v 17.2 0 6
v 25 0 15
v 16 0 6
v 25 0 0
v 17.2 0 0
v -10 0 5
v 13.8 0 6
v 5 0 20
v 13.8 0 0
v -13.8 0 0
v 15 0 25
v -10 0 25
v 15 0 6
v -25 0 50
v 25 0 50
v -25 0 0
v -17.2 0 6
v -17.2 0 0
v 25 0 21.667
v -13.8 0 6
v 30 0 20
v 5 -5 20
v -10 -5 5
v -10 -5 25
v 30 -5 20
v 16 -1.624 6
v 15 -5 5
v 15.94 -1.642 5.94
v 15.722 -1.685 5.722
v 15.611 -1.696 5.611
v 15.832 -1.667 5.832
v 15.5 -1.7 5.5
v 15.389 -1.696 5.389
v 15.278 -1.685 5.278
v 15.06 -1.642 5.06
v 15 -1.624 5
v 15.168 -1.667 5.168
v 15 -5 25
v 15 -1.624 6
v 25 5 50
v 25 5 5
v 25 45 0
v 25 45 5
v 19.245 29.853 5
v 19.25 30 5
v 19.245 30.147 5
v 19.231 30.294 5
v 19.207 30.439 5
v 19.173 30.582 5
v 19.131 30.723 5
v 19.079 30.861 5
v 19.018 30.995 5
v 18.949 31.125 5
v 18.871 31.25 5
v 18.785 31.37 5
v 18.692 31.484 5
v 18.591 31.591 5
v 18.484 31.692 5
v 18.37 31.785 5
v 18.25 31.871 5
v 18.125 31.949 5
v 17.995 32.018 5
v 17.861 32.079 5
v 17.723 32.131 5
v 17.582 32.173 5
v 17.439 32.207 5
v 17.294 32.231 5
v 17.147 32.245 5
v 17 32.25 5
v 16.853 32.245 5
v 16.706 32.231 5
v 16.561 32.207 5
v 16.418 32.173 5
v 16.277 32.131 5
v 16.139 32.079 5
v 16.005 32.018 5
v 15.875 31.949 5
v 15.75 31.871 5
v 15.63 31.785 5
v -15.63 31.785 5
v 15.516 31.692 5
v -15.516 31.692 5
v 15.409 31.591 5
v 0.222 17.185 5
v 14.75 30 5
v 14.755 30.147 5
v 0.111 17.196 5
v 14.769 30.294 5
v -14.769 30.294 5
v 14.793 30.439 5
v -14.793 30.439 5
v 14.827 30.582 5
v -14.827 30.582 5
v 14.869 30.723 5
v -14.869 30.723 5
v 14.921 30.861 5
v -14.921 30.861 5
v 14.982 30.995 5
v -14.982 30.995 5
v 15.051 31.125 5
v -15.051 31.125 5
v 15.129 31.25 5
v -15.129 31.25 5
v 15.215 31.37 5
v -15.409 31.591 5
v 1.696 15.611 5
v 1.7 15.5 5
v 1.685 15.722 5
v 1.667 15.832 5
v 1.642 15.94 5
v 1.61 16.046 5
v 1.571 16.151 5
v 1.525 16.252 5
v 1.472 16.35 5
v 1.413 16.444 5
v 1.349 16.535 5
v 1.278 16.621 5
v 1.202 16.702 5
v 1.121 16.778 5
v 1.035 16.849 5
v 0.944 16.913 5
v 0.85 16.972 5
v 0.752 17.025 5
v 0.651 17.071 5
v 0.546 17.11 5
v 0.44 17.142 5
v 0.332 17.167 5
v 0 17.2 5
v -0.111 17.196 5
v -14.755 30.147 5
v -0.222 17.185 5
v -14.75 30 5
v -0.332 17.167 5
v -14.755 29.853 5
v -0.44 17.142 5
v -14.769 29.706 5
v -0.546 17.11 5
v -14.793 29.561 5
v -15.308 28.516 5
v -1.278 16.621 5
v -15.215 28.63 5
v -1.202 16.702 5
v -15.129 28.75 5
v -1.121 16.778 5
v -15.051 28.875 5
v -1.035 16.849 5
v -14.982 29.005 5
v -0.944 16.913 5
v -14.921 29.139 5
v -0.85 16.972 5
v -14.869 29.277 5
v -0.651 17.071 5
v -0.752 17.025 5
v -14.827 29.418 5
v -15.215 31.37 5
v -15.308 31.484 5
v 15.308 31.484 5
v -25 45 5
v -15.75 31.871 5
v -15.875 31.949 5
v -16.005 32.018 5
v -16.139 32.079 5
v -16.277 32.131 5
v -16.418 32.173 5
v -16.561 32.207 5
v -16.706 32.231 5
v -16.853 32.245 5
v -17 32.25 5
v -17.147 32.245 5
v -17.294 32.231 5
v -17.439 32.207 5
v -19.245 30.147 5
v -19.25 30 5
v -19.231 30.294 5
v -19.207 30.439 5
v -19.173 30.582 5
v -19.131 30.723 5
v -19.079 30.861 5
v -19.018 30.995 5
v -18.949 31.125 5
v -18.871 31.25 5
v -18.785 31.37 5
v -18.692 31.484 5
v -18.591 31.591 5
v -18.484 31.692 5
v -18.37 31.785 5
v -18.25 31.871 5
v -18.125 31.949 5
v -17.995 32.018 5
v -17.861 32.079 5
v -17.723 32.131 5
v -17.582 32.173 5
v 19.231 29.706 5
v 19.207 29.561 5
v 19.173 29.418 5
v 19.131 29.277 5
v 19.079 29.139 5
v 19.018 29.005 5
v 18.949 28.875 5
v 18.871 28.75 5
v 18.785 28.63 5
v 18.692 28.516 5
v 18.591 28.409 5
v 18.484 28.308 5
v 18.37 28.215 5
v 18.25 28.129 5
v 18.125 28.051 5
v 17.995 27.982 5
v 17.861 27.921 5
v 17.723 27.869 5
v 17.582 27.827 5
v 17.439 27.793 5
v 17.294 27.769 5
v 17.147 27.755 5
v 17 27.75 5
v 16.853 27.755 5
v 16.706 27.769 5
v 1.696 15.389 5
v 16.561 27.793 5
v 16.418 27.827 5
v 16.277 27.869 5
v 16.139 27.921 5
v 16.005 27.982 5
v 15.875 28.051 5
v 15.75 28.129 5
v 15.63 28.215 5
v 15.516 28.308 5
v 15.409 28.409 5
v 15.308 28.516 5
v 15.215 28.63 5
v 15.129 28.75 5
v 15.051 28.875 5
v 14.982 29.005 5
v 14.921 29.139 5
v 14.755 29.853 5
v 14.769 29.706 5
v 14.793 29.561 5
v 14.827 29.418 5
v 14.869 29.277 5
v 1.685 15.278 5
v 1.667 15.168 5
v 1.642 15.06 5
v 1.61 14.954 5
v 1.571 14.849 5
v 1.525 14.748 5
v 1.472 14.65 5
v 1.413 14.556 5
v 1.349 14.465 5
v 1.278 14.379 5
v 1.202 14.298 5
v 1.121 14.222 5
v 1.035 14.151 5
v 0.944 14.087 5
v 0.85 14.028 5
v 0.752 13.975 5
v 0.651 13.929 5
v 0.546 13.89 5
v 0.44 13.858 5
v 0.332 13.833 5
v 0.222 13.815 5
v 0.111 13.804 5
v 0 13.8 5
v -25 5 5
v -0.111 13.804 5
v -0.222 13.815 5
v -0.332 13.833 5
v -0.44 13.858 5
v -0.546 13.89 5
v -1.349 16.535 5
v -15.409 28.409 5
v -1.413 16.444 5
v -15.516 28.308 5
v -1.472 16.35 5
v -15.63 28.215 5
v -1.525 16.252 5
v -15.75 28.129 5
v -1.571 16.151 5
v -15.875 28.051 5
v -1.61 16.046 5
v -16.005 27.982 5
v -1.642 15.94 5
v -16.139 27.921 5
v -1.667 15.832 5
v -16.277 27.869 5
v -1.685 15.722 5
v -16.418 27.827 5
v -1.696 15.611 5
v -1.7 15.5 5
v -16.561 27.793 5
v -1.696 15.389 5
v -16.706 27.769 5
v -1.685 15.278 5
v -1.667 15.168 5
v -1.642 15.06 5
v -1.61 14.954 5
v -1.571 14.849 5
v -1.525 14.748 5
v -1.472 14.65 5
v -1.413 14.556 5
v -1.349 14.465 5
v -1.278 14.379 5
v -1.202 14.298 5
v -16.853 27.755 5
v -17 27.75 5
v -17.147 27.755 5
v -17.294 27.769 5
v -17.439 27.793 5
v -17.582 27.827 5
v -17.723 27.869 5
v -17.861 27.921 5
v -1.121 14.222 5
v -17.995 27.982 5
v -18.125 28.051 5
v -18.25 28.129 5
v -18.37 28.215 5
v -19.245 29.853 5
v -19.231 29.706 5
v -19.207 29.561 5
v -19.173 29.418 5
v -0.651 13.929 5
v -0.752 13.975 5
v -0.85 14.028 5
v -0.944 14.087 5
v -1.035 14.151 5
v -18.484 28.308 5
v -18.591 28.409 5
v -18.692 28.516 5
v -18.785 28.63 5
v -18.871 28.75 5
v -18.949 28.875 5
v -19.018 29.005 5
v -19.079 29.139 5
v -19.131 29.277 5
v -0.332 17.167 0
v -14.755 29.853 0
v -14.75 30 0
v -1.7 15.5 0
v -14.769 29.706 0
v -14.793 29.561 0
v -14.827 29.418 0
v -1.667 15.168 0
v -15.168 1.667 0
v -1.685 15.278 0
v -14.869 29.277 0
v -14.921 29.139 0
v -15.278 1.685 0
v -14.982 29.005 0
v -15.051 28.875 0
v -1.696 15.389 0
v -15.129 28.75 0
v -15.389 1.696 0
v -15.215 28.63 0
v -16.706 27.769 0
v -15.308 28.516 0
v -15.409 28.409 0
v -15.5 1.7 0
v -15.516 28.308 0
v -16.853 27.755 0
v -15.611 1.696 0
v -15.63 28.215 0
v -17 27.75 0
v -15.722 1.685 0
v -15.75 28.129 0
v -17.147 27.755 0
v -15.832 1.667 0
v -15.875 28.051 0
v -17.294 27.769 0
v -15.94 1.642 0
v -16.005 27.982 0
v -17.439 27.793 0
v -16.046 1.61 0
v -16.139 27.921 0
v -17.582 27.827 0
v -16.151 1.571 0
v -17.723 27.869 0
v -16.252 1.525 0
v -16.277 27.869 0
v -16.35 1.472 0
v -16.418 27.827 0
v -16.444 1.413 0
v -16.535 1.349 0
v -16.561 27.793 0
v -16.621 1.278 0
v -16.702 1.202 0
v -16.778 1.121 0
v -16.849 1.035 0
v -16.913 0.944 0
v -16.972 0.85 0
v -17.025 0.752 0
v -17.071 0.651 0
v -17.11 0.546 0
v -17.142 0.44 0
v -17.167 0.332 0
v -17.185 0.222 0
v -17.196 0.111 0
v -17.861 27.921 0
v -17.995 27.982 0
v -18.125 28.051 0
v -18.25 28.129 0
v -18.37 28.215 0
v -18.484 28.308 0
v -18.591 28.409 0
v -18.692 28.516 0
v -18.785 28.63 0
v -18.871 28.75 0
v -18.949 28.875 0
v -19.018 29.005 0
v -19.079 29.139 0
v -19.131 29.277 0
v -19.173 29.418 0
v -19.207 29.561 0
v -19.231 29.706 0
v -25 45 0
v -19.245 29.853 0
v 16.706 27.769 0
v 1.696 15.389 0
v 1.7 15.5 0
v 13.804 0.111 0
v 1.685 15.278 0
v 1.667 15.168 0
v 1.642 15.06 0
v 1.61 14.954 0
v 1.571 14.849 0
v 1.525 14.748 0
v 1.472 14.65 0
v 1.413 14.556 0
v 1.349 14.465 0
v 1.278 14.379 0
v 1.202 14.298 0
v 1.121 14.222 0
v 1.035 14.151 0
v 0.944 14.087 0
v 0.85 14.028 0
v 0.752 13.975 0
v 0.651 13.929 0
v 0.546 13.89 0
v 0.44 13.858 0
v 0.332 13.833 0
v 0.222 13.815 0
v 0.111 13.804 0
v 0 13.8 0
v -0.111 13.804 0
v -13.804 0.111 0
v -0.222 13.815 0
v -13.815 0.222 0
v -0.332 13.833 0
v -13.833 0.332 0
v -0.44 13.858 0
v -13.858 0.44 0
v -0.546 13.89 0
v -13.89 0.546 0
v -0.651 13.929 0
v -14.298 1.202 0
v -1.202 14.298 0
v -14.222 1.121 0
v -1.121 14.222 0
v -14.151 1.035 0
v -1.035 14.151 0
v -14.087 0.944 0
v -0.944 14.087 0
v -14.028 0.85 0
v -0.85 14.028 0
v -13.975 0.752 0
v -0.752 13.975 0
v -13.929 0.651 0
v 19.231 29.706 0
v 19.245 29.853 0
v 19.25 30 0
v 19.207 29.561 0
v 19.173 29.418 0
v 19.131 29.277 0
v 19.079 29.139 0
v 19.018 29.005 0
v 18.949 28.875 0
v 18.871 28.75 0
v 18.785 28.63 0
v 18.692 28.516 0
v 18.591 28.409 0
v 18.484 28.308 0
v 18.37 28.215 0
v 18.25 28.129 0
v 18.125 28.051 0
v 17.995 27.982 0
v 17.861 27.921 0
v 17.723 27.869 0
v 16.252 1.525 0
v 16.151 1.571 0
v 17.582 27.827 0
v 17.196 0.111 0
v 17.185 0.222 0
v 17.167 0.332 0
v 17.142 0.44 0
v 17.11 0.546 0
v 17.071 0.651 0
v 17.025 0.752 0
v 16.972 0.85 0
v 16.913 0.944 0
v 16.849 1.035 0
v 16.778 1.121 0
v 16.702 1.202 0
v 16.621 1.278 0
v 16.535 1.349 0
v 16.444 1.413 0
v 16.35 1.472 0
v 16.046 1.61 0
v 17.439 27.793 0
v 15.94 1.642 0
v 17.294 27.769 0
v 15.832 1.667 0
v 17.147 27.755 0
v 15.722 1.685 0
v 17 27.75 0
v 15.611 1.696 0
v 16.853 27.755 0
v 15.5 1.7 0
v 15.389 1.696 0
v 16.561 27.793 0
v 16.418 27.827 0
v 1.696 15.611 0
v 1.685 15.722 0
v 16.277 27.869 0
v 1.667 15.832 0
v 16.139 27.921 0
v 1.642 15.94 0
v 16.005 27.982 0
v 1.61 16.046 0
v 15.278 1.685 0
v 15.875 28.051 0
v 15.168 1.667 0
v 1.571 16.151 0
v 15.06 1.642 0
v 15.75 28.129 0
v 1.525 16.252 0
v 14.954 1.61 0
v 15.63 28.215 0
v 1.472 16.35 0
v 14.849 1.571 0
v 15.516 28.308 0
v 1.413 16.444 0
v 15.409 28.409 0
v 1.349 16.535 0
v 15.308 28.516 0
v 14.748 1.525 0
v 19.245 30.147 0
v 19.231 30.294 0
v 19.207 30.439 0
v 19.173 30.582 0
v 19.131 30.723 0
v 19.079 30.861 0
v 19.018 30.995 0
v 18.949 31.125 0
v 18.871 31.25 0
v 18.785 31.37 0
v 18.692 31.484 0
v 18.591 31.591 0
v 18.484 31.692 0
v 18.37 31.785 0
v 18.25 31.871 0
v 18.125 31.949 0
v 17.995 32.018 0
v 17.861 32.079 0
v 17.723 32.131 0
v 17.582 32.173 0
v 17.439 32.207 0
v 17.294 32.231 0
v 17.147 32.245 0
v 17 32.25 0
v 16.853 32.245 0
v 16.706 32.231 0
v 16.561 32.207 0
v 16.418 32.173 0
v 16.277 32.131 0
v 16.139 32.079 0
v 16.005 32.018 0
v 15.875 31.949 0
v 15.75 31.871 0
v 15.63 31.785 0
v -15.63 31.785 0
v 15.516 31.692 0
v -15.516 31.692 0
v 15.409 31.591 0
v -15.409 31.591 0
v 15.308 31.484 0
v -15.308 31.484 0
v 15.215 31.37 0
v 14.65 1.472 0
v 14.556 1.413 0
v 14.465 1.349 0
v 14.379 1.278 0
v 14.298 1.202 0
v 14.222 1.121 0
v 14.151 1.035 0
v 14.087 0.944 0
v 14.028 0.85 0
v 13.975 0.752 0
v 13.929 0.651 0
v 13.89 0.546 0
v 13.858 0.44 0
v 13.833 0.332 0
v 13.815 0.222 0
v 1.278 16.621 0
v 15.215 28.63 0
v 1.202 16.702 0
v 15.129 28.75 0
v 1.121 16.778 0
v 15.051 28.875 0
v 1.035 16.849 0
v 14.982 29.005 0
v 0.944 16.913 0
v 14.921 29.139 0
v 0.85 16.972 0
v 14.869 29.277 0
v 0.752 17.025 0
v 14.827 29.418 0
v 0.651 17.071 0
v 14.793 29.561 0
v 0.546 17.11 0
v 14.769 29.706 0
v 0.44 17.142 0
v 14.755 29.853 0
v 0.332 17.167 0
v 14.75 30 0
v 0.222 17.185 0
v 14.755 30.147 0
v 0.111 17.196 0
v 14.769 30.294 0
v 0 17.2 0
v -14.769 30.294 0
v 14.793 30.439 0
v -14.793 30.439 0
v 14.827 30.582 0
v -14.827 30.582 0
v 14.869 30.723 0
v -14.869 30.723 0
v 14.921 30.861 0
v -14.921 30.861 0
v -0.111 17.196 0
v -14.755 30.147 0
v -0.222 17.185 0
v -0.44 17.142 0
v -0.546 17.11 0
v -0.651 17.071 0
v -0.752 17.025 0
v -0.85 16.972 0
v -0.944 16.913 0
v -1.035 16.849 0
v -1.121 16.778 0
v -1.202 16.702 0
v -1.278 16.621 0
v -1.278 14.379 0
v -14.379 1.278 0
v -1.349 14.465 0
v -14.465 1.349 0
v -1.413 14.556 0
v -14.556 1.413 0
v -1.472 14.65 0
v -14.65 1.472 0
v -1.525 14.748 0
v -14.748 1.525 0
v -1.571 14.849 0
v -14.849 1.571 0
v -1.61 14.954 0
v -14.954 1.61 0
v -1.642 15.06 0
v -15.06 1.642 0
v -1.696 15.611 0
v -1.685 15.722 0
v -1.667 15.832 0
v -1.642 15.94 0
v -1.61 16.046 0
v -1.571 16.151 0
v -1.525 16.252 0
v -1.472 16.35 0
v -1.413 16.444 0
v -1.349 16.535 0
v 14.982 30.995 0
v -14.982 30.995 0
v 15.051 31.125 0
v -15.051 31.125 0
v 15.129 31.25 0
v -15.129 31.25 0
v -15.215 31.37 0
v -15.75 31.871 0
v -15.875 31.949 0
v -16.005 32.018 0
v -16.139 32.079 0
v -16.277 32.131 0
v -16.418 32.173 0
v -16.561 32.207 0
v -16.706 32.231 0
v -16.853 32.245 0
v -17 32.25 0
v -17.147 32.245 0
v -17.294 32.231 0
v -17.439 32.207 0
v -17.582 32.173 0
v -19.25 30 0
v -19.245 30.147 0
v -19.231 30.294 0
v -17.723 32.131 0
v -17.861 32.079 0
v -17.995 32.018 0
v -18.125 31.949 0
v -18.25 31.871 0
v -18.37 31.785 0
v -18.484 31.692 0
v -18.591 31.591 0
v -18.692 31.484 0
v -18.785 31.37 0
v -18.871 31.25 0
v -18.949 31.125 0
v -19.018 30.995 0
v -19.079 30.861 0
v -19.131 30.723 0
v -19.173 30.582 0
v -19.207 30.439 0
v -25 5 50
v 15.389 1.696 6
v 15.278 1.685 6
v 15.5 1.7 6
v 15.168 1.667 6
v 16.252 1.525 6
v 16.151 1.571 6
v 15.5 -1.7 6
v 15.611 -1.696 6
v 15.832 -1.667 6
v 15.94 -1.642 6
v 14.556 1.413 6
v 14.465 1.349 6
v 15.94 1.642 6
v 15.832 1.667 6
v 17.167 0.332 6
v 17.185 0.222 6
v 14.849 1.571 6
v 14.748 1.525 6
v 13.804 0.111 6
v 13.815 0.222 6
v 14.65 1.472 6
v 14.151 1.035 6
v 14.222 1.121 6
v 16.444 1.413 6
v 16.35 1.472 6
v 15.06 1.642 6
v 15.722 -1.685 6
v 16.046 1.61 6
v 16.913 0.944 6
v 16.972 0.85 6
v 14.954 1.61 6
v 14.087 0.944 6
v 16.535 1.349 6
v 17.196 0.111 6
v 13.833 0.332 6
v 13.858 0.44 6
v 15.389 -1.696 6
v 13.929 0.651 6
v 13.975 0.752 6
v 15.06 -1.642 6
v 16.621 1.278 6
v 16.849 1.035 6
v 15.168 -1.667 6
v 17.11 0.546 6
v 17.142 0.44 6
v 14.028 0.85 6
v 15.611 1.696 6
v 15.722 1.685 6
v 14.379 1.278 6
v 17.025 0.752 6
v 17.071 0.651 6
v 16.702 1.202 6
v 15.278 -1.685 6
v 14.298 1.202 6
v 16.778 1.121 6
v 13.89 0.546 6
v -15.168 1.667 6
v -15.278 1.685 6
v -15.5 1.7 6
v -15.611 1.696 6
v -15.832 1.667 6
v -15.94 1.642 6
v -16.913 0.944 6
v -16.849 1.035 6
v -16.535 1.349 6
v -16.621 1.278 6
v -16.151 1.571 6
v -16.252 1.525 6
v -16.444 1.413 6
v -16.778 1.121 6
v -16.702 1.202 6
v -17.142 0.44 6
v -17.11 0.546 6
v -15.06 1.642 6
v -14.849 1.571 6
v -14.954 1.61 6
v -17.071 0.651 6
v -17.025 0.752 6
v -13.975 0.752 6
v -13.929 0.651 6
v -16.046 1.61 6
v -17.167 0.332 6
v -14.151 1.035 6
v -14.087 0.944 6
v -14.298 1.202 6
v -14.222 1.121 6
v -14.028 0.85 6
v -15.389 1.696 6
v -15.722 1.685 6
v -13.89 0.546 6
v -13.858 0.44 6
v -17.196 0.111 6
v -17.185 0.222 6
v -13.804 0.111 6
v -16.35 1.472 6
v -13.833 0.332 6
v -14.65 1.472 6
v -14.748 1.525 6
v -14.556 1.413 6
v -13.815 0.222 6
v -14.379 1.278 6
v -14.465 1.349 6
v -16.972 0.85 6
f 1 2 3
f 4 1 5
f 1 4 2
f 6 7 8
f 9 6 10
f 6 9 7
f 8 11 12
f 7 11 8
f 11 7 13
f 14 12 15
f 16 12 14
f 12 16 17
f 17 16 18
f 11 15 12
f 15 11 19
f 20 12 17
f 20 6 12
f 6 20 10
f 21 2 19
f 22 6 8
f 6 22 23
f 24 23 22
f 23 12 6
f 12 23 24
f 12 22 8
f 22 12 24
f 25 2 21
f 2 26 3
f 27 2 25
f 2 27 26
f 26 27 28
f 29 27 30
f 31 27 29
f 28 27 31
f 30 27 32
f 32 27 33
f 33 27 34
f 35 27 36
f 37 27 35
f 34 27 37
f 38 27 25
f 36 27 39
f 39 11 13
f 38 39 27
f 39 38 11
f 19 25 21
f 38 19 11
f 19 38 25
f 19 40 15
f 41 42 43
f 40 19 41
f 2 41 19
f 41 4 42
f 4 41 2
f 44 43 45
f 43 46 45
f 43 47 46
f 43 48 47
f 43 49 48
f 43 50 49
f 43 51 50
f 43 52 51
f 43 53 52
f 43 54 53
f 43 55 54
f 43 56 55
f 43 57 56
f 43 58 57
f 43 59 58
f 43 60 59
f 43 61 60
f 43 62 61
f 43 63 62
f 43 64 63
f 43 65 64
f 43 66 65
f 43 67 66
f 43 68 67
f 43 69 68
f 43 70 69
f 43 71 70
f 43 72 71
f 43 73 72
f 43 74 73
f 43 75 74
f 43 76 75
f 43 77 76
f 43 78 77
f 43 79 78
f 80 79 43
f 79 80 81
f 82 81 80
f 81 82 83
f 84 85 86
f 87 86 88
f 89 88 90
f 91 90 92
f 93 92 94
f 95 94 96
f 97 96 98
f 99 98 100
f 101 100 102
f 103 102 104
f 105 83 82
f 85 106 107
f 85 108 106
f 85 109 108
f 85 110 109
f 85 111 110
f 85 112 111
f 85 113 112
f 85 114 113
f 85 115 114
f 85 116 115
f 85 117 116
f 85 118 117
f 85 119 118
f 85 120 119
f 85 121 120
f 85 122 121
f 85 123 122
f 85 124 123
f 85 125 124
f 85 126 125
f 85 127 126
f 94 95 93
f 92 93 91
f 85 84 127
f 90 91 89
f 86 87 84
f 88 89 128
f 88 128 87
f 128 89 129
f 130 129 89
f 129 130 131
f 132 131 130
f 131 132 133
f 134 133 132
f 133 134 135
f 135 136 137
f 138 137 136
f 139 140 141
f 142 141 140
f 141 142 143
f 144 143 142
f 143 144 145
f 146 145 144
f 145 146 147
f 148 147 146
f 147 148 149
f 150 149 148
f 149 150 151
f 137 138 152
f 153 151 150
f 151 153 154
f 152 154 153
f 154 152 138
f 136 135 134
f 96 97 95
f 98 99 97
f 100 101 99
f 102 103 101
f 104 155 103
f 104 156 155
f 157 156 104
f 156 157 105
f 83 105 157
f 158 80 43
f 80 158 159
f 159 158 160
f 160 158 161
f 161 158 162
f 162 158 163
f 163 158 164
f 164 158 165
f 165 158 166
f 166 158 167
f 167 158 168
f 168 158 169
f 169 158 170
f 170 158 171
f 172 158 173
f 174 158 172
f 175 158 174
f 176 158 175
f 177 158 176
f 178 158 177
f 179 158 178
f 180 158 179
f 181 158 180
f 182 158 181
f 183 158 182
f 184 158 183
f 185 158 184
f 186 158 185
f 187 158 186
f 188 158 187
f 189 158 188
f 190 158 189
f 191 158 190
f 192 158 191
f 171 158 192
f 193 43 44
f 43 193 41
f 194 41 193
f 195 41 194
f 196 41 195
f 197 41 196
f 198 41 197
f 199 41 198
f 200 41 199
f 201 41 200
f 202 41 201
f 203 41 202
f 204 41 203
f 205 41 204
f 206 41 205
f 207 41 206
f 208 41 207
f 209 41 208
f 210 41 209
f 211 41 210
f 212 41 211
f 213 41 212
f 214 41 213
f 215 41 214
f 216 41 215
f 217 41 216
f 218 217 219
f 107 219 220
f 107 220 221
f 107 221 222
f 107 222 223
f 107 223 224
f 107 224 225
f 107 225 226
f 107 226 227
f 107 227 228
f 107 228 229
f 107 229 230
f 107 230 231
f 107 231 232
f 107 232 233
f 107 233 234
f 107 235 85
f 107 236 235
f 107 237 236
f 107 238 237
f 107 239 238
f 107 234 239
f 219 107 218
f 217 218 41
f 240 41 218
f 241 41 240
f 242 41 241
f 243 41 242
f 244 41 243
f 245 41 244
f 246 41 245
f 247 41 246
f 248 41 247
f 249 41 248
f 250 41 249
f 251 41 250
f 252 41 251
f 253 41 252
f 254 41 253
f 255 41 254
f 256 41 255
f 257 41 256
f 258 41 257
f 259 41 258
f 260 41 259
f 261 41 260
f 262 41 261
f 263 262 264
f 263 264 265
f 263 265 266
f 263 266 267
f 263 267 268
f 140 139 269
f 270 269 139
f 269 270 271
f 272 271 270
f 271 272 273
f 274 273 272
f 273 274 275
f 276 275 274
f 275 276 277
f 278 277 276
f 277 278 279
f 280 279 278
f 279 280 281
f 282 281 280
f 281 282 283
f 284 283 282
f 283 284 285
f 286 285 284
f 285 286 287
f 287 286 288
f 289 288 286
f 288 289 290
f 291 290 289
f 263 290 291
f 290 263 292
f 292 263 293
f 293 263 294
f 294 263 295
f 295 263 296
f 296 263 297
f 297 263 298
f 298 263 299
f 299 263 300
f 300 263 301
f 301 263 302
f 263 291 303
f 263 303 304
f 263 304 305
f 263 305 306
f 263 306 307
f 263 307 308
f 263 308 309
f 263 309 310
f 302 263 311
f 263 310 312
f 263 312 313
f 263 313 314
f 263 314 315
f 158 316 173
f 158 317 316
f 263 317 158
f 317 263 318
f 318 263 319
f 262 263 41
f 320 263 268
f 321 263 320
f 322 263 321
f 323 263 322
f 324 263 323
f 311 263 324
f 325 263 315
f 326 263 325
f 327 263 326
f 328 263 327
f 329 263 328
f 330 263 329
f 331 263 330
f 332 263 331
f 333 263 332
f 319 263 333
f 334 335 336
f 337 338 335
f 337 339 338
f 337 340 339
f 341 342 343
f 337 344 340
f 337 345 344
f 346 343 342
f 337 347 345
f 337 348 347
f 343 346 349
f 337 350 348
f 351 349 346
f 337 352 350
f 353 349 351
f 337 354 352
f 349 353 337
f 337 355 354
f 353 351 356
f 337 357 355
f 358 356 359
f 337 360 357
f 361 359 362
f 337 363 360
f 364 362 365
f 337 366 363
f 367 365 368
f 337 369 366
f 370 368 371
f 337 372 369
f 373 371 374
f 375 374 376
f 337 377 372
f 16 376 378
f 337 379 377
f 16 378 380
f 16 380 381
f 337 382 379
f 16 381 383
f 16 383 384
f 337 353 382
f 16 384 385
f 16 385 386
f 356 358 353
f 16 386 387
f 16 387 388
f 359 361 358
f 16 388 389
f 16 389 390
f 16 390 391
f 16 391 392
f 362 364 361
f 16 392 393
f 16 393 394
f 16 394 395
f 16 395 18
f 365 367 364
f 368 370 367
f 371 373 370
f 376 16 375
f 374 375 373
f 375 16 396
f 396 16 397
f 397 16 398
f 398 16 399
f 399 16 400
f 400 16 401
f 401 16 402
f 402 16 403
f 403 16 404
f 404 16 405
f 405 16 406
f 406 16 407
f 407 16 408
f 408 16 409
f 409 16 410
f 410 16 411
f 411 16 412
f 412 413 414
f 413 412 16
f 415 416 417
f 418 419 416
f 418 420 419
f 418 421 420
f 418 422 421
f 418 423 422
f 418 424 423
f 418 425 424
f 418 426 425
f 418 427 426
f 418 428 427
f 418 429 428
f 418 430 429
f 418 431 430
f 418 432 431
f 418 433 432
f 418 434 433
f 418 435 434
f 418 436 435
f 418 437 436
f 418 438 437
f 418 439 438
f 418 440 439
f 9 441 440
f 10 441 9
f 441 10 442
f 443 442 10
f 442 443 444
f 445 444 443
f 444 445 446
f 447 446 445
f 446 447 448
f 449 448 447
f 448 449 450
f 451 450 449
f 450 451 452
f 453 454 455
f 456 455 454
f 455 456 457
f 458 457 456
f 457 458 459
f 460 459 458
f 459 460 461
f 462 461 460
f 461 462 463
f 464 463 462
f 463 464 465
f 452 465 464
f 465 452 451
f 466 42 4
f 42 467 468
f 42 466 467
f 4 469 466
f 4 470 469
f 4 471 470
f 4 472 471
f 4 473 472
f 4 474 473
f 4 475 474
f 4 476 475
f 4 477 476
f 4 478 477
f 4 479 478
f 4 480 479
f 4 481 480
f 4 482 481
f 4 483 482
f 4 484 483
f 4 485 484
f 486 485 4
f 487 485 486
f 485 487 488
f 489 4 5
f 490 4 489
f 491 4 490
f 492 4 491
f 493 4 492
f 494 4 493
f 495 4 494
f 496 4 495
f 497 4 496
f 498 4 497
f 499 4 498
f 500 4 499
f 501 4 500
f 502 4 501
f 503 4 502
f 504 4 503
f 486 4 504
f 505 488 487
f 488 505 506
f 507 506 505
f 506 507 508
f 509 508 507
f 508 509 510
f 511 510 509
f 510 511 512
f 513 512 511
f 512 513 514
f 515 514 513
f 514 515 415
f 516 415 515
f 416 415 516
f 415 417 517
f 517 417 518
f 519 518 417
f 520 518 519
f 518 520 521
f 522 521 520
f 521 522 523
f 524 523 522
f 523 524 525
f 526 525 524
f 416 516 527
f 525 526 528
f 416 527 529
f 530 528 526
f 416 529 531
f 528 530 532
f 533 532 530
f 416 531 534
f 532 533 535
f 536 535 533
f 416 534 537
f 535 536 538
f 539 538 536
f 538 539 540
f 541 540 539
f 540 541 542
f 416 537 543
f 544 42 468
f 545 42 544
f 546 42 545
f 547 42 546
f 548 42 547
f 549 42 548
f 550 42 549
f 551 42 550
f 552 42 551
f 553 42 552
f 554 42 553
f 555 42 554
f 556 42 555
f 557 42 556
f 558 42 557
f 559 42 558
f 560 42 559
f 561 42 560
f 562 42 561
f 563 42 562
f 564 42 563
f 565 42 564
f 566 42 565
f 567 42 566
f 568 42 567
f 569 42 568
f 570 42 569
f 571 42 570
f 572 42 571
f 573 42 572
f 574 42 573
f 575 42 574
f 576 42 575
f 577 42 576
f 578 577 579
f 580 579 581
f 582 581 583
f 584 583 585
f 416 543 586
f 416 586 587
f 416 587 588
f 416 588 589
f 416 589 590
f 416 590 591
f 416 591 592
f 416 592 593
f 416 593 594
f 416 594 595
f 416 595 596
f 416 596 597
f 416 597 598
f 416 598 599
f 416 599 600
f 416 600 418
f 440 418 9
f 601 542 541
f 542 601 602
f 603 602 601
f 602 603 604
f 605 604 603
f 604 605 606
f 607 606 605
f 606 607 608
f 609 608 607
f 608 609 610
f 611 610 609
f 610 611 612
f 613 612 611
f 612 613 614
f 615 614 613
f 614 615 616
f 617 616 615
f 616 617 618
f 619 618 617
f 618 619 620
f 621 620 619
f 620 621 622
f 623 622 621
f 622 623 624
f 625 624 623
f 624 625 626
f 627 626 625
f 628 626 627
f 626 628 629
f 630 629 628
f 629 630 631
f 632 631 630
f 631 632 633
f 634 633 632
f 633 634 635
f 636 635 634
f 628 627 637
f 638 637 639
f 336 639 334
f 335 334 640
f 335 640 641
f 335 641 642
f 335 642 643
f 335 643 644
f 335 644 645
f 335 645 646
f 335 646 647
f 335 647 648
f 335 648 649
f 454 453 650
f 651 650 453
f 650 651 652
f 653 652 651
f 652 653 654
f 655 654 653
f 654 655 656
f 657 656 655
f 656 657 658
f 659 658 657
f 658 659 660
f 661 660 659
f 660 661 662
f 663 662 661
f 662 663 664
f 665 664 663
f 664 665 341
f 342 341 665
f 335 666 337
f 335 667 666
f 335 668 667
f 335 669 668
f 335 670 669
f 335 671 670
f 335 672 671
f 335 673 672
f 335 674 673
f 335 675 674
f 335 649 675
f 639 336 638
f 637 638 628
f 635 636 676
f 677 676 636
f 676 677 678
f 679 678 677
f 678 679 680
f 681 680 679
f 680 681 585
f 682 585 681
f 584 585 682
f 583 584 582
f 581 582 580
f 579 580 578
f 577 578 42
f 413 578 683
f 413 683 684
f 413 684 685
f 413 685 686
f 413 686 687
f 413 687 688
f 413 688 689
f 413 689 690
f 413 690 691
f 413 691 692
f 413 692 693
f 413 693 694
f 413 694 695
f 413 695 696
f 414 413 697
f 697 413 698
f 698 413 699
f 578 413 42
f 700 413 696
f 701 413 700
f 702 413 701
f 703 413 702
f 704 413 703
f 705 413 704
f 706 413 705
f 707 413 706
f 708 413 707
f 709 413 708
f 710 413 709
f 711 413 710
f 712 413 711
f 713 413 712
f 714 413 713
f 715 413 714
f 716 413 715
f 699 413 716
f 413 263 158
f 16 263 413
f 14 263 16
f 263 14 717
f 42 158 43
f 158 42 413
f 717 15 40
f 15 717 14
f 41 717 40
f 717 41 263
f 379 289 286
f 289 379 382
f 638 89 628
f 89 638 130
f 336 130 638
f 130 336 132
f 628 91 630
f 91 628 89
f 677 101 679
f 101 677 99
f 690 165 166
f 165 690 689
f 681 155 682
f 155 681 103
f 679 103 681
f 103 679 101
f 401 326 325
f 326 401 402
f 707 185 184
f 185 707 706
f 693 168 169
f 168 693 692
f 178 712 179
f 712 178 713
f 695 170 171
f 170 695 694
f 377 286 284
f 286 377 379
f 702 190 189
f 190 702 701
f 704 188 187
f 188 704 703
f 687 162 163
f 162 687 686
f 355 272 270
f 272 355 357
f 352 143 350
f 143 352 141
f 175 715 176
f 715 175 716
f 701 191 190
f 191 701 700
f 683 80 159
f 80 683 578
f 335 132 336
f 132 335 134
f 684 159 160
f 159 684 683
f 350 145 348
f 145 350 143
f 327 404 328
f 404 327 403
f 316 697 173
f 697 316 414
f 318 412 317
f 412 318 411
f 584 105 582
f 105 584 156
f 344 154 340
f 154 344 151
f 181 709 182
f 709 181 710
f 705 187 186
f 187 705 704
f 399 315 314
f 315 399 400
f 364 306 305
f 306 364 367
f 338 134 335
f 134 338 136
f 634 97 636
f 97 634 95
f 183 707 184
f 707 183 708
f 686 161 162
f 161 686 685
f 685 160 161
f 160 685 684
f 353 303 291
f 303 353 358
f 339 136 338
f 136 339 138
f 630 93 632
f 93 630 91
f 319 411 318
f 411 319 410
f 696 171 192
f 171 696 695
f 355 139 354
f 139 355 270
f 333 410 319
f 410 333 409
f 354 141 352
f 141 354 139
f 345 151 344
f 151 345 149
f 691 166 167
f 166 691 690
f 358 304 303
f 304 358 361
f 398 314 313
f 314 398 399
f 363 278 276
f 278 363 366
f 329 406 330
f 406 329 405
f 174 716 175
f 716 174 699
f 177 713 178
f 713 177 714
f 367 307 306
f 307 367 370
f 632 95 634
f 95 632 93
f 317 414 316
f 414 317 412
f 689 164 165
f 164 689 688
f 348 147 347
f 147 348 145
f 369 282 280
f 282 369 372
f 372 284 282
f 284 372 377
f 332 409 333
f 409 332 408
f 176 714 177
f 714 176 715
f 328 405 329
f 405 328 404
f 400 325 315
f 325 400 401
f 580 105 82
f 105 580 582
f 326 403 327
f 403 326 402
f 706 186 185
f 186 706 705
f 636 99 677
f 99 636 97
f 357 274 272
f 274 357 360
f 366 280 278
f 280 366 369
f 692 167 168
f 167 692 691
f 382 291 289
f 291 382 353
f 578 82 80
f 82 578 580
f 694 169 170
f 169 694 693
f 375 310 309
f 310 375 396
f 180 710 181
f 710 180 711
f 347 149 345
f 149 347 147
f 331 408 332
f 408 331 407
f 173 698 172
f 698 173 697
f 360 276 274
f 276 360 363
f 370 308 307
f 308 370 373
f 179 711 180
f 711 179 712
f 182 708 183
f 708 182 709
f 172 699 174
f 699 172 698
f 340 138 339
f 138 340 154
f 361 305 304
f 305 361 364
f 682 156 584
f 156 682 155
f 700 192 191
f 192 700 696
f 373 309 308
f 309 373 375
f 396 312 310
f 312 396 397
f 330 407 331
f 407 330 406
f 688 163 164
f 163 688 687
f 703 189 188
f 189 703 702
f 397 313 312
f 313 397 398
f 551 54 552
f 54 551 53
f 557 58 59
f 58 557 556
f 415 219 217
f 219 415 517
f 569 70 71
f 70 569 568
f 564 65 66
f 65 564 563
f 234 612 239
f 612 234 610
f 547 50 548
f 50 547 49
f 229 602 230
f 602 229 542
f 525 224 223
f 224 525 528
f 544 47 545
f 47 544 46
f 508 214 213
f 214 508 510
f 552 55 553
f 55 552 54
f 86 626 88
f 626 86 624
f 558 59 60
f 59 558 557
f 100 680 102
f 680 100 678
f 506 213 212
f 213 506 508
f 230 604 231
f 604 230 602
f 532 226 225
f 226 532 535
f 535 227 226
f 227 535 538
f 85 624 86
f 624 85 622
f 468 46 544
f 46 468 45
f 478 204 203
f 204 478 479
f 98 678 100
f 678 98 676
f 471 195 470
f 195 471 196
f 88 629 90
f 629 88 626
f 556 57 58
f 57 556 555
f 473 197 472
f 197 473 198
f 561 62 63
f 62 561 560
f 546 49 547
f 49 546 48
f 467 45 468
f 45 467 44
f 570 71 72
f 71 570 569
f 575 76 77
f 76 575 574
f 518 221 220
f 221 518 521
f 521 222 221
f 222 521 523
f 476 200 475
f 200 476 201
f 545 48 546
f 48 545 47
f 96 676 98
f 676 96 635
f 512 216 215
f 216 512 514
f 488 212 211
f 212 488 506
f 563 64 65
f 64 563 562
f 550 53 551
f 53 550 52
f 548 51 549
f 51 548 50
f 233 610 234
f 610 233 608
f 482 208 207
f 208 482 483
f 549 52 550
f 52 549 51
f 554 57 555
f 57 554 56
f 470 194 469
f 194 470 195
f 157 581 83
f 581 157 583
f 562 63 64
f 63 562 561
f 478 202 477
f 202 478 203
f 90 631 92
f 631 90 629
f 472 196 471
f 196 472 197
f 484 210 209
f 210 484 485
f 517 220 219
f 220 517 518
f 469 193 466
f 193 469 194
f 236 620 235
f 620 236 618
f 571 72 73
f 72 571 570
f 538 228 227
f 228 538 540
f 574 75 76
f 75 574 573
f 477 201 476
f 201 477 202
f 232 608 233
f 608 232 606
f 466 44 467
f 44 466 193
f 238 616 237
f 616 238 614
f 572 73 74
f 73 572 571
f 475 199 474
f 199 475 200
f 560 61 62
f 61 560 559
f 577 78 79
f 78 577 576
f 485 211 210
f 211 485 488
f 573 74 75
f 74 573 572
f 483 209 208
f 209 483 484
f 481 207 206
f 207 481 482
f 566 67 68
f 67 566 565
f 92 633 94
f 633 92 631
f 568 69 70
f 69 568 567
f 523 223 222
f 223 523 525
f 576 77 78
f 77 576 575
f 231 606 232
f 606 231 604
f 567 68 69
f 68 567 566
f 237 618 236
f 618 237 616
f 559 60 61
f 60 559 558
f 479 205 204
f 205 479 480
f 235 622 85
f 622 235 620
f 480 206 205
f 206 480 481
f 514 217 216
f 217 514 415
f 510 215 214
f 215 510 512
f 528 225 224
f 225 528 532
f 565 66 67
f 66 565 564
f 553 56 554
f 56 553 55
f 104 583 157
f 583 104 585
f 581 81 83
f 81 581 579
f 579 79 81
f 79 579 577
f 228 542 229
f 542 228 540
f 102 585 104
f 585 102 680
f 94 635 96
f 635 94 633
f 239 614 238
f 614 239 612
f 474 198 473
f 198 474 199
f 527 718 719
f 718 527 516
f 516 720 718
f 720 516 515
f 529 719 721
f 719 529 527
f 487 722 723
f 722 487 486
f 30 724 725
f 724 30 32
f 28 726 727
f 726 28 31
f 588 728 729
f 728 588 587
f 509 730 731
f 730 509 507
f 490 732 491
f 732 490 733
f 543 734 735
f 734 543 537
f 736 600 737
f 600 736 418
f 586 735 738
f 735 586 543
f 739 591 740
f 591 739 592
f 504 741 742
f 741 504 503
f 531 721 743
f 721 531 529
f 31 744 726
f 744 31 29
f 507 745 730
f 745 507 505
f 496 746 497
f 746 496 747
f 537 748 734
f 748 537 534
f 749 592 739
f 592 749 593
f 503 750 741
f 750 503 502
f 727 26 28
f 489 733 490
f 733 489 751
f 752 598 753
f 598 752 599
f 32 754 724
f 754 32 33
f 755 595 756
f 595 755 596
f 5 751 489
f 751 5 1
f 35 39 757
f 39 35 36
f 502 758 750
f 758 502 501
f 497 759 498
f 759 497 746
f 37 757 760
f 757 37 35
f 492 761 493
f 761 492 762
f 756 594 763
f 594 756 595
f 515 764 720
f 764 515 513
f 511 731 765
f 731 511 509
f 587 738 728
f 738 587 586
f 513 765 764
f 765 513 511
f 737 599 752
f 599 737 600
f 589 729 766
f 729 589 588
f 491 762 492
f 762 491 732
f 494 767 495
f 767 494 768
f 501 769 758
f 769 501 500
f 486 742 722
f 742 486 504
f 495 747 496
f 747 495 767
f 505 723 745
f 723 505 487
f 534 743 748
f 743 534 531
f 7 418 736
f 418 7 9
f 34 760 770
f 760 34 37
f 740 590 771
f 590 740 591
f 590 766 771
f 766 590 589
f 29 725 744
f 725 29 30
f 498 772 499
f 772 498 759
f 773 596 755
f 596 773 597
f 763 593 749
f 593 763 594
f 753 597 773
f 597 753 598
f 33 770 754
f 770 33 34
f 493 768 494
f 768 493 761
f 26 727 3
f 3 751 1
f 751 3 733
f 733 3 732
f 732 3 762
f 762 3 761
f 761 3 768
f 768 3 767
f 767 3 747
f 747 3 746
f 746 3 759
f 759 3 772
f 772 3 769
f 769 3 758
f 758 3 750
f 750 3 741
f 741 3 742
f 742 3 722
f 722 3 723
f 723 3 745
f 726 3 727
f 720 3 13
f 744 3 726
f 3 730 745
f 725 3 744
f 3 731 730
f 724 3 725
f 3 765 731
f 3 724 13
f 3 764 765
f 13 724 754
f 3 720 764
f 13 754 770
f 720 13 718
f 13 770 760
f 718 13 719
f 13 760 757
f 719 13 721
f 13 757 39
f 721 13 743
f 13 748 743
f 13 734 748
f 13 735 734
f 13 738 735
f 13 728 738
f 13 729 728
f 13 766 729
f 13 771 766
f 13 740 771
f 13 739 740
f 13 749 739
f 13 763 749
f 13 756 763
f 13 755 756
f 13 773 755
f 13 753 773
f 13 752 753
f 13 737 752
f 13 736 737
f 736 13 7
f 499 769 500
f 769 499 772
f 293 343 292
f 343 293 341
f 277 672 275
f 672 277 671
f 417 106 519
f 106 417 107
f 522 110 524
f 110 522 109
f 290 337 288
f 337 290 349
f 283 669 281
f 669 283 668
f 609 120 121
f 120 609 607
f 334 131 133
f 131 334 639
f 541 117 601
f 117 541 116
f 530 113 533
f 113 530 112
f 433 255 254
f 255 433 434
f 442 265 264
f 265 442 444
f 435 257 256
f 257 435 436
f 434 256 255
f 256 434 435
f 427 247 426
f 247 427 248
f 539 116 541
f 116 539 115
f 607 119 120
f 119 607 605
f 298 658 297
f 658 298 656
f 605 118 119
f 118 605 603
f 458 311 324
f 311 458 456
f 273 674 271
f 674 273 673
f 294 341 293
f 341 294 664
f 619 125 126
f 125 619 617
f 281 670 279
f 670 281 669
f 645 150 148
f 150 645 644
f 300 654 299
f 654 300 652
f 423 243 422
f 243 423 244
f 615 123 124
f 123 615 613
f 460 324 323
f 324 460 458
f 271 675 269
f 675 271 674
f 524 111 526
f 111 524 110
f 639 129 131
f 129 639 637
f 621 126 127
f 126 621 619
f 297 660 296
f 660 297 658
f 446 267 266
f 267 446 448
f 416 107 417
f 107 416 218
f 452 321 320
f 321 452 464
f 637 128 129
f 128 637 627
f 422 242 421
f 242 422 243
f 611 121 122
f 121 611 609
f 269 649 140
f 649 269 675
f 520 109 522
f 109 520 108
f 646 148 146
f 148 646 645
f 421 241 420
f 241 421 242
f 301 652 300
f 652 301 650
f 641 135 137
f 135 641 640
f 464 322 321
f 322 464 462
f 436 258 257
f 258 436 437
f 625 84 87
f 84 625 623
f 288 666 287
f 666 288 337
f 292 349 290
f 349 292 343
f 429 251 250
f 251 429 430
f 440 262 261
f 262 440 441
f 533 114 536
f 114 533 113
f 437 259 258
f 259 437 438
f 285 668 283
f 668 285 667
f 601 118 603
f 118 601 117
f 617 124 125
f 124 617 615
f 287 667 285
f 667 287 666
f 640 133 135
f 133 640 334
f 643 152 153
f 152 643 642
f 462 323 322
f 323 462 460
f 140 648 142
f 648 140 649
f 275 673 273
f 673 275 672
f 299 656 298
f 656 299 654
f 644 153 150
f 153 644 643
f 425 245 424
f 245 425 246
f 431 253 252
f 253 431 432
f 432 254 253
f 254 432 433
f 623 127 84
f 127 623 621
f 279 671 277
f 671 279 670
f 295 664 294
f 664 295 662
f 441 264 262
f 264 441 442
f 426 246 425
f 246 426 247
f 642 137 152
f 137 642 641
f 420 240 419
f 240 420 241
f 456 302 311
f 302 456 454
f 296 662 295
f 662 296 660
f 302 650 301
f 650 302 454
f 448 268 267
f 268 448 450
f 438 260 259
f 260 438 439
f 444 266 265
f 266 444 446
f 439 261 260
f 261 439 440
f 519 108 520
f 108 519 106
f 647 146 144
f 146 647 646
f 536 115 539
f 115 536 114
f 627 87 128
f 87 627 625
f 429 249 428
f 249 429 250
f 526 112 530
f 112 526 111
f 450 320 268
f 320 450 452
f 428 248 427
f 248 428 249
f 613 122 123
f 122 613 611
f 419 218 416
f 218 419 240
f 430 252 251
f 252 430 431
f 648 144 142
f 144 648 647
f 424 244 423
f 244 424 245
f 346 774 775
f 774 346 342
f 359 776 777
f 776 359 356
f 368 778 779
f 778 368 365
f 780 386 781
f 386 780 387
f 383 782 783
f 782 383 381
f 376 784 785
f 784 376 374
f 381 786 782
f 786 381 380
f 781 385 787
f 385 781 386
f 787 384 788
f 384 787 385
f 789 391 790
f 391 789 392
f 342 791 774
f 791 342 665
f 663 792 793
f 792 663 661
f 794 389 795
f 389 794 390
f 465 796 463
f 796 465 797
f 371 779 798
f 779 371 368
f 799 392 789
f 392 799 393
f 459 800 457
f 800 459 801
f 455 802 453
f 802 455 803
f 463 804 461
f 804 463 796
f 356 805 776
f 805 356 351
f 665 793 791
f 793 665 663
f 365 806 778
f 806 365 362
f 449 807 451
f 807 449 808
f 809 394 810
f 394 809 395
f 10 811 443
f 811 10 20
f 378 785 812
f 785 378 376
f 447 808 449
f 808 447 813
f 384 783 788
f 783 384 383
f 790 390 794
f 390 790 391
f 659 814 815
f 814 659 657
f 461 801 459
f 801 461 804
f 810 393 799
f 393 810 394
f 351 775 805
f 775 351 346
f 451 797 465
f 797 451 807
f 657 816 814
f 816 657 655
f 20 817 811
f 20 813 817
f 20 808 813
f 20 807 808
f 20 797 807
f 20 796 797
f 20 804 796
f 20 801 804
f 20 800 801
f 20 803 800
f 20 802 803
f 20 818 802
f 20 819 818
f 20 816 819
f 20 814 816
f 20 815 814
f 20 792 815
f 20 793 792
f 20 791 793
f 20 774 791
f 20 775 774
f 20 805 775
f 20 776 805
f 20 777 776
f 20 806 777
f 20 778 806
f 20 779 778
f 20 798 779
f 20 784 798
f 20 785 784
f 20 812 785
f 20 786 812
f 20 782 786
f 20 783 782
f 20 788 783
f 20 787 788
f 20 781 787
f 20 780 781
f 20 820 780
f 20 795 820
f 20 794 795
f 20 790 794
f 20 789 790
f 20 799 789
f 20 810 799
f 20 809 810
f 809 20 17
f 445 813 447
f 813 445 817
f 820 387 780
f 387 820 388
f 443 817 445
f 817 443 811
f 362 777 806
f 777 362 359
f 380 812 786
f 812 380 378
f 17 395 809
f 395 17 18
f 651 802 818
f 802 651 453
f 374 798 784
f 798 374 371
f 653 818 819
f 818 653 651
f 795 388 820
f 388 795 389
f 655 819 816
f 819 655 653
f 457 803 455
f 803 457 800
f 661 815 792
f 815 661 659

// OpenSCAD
// L-shaped mounting bracket for a NEMA 17 stepper motor (e.g. syringe pump)
// Print orientation: base plate on the bed, motor plate building upward (+Z)

// ---------------- Parameters ----------------
plate_x      = 25;    // base plate half-length in X (mm)
plate_y      = 45;    // base plate length in Y (mm)
plate_t      = 5;     // base plate thickness in Z (mm)

hole_m4_x    = 17;    // M4 through-hole offset from centre in X (mm)
hole_m4_y    = 30;    // M4 through-hole Y position (mm)
hole_m4_d    = 4.5;   // M4 through-hole diameter (mm)

motor_hole_d = 23;    // motor centring boss hole diameter (mm)
motor_hole_x = 0;     // motor hole centre X (mm)
motor_hole_z = 28;    // motor hole centre Z (mm)

screw_d      = 3.4;   // M3 screw hole diameter (mm)
screw_pitch  = 31;    // square pattern pitch for screw holes (mm)

gusset_t     = 5;     // gusset thickness in X (mm)
gusset_leg   = 20;    // gusset leg length along +Y and +Z (mm)

eps          = 0.5;   // cutter overshoot past faces (mm)
$fn          = 96;    // curve resolution

// ---------------- Model ----------------
difference() {
    union() {
        // Base plate
        translate([-plate_x, 0, 0])
            cube([plate_x * 2, plate_y, plate_t]);

        // Vertical motor plate
        translate([-plate_x, 0, 0])
            cube([plate_x * 2, 5, 50]);

        // Gussets: right triangles in YZ, flush with left and right edges
        for (sx = [-1, 1])
            translate([sx > 0 ? plate_x - gusset_t : -plate_x, 0, 0])
                rotate([90, 0, 0])
                    linear_extrude(height = gusset_t)
                        polygon(points = [
                            [5 - sx * 10, 5],              // right-angle corner
                            [5 - sx * 10, 5 + gusset_leg], // along +Y
                            [20 - sx * 10, 20]             // along +Z
                        ]);
    }

    // Base plate through-holes
    for (x = [-hole_m4_x, hole_m4_x])
        translate([x, hole_m4_y, -eps])
            cylinder(d = hole_m4_d, h = plate_t + 2 * eps);

    // Motor boss hole
    translate([motor_hole_x, plate_y / 2, motor_hole_z])
        cylinder(d = motor_hole_d, h = plate_t + 2 * eps);

    // Screw holes on square pattern centred on boss hole
    for (a = [0, 90, 180, 270])
        rotate([0, 0, a])
            translate([0, -screw_pitch / 2, 0])
                cylinder(d = screw_d, h = plate_t + 2 * eps);
}
